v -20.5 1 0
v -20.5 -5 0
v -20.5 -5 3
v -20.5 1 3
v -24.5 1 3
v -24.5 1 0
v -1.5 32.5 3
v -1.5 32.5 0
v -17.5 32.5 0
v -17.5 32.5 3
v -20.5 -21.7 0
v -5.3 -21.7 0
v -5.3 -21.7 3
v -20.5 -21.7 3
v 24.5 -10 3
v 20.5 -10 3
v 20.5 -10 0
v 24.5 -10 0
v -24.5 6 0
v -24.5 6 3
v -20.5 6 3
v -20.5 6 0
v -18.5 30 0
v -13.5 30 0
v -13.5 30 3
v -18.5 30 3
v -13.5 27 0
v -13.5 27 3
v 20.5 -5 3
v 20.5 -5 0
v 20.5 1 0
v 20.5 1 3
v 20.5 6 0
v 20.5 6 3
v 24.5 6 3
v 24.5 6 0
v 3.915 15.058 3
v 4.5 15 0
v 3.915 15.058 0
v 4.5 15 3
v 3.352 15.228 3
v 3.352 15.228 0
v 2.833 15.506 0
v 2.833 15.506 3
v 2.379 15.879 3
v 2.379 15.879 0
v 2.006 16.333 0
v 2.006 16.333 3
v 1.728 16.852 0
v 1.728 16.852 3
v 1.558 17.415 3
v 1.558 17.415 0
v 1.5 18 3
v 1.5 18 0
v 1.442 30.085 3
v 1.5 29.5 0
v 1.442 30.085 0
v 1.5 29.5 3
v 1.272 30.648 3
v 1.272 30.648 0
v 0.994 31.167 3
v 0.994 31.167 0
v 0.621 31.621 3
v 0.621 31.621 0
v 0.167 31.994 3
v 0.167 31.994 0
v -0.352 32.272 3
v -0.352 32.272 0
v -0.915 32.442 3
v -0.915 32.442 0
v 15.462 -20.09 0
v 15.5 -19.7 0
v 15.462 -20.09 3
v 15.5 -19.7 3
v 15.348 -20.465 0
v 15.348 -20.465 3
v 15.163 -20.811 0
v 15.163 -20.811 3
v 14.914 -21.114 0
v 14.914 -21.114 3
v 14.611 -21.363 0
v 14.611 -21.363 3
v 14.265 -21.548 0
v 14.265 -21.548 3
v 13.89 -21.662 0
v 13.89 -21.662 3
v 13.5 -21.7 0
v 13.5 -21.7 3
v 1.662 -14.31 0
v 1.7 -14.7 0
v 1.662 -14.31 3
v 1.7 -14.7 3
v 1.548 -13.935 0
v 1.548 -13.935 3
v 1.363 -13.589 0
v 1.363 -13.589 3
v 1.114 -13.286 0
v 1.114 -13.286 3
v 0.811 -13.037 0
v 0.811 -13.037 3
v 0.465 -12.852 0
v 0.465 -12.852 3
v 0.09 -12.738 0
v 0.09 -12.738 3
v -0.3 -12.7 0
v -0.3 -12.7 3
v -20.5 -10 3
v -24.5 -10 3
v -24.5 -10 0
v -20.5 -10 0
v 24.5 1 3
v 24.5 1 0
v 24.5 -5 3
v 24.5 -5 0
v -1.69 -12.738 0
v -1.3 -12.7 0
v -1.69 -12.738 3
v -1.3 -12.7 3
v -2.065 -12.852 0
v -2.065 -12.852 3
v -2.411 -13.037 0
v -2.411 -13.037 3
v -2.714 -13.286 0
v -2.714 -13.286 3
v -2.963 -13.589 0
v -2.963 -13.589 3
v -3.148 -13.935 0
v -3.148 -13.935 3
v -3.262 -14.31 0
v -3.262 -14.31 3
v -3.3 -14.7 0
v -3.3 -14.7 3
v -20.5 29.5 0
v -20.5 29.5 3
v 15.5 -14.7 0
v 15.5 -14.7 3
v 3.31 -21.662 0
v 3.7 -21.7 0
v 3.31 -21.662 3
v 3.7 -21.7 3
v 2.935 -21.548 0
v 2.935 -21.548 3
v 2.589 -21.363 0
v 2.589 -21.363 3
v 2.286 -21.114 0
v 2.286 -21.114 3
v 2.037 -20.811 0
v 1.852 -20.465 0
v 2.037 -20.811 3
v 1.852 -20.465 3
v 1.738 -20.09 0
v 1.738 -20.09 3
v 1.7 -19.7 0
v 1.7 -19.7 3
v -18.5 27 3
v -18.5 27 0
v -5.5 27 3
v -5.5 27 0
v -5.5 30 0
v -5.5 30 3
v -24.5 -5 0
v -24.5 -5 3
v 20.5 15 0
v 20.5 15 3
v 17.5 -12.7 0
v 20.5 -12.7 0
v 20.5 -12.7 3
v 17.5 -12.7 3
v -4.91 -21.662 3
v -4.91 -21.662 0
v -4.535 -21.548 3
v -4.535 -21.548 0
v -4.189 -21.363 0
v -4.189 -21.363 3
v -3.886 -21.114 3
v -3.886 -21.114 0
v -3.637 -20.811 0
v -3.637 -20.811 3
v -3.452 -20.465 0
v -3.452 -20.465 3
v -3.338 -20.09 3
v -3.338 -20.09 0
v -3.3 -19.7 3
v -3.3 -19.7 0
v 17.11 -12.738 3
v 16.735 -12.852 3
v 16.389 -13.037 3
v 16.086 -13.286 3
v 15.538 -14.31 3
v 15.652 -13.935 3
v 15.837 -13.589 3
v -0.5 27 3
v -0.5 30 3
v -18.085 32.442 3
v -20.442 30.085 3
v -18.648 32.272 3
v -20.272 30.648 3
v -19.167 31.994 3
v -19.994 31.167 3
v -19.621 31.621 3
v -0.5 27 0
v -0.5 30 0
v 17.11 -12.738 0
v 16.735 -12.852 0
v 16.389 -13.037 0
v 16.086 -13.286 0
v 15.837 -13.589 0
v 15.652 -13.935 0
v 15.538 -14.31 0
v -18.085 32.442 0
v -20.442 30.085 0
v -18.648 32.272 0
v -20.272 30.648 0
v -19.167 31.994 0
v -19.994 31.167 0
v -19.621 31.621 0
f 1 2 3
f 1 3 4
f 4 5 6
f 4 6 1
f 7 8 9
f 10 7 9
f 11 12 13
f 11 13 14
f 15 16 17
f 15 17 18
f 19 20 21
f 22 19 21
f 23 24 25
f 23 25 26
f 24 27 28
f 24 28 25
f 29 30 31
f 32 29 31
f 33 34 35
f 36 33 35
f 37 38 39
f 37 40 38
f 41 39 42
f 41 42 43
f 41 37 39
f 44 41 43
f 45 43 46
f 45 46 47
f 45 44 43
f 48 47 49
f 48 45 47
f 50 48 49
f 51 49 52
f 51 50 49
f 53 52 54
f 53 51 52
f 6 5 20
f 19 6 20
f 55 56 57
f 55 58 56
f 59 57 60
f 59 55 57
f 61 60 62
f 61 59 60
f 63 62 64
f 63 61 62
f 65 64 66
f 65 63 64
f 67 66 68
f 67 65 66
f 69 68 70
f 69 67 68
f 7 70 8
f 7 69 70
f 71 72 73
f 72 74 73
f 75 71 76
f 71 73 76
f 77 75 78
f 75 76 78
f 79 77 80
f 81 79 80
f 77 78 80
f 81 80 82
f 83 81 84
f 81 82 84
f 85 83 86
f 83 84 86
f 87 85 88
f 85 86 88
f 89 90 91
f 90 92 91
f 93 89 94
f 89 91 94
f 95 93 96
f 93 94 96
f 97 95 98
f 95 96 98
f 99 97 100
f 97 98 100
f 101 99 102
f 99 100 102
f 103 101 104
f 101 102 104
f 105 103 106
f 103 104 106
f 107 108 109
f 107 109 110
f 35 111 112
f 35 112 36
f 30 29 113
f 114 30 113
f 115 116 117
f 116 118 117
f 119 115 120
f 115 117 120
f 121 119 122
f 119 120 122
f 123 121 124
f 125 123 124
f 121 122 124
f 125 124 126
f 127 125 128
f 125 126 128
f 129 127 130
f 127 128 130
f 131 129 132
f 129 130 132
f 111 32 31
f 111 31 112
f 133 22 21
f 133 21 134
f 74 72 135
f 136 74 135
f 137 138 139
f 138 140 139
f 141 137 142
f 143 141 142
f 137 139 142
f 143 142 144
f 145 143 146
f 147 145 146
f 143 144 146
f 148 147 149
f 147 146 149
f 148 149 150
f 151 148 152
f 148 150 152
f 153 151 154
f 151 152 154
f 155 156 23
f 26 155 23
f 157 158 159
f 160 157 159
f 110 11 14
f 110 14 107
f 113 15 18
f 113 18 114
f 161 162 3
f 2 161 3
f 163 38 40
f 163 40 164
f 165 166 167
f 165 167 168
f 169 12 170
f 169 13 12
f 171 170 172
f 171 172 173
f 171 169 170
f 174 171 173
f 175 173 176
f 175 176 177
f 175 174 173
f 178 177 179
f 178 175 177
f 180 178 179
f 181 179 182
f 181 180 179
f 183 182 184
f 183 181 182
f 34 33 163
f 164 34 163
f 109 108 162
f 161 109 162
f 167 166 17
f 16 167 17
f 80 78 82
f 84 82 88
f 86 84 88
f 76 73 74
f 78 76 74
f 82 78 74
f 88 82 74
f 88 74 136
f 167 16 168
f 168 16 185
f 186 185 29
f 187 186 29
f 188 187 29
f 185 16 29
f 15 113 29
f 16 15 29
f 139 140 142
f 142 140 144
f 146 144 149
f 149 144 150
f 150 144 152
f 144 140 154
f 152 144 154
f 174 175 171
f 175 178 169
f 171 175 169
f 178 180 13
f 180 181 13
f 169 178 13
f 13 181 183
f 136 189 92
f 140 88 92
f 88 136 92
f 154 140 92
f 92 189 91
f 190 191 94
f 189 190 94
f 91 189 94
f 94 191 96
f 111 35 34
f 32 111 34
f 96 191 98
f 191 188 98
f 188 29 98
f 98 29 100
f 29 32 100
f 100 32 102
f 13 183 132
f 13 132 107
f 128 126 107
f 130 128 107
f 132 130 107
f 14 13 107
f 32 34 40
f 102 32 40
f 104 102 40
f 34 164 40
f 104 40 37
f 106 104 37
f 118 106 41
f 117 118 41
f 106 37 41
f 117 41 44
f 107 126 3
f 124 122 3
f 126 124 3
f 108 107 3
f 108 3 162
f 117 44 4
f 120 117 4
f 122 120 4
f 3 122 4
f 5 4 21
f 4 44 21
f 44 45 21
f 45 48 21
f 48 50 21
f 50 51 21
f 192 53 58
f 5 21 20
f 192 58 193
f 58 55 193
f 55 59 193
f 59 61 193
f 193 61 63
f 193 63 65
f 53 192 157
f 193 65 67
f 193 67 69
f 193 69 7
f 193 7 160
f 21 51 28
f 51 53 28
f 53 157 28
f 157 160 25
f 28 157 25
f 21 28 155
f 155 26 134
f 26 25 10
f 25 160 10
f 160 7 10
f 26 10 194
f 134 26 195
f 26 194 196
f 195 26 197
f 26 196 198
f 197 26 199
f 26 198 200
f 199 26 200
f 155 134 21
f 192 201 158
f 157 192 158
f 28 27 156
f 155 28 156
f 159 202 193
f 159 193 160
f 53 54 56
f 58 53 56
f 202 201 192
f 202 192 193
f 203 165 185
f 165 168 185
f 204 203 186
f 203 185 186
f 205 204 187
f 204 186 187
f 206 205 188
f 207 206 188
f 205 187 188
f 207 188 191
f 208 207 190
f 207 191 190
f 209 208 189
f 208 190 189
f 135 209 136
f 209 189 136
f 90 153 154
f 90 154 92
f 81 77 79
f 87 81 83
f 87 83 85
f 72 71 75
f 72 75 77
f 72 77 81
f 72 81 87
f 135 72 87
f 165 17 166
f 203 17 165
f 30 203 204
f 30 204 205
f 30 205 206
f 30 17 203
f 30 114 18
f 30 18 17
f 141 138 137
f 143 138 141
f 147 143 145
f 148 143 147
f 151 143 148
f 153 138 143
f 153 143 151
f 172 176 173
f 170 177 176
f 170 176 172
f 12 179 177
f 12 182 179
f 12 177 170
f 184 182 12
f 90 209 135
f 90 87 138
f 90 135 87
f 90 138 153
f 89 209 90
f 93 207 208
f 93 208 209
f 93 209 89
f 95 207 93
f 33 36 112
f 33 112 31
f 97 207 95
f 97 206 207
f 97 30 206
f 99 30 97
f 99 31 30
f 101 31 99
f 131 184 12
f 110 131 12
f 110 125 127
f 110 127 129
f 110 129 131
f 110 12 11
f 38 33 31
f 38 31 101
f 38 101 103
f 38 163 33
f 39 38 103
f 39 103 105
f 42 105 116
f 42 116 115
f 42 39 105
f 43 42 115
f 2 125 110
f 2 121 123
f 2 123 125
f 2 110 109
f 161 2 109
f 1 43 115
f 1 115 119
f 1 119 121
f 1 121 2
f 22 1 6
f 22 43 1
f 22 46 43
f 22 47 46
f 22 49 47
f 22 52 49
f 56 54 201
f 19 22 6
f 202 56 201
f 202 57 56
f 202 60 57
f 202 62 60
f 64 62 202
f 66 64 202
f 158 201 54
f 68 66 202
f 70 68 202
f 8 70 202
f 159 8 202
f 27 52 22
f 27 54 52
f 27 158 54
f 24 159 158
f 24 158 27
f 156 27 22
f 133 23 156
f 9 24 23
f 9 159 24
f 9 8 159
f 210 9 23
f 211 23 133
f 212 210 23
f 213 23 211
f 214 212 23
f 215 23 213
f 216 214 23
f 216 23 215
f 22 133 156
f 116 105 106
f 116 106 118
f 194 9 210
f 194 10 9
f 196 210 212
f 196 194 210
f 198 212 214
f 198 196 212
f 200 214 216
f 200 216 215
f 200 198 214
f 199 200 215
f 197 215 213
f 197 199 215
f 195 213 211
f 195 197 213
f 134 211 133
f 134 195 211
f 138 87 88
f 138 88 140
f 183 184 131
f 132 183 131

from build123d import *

# Parameters (mm, degrees)
SKETCH_1_W          = 41
SKETCH_1_H          = 30
EXTRUDE_1_DEPTH     = 3
SKETCH_2_W          = 4
SKETCH_2_H          = 5
EXTRUDE_2_DEPTH     = 3
SKETCH_3_W          = 22
SKETCH_3_H          = 17.5
EXTRUDE_3_DEPTH     = 3
SKETCH_4_W          = 5
SKETCH_4_H          = 3
CUT_EXTRUDE_1_DEPTH = 10
SKETCH_5_W          = 41
SKETCH_5_H          = 6.7
EXTRUDE_4_DEPTH     = 3
SKETCH_6_W          = 5
SKETCH_6_H          = 9
CUT_EXTRUDE_2_DEPTH = 10
FILLET_1_R          = 3
FILLET_2_R          = 2


with BuildPart() as part:
    # 草图1 → 凸台-拉伸1 (new body)
    with BuildSketch(Plane.XY):
        Rectangle(SKETCH_1_W, SKETCH_1_H)
    extrude(amount=EXTRUDE_1_DEPTH)

    # 草图2 → 凸台-拉伸2 (add)
    with BuildSketch(Plane.XY.offset(3)):
        with Locations((22.5, -7.5)):
            Rectangle(SKETCH_2_W, SKETCH_2_H)
        with Locations((22.5, 3.5)):
            Rectangle(SKETCH_2_W, SKETCH_2_H)
        with Locations((-22.5, -7.5)):
            Rectangle(SKETCH_2_W, SKETCH_2_H)
        with Locations((-22.5, 3.5)):
            Rectangle(SKETCH_2_W, SKETCH_2_H)
    extrude(amount=-EXTRUDE_2_DEPTH)

    # 草图3 → 凸台-拉伸3 (add)
    with BuildSketch(Plane(origin=(0, 0, 0), x_dir=(-1, 0, 0), z_dir=(0, 0, -1))):
        with Locations((9.5, 23.75)):
            Rectangle(SKETCH_3_W, SKETCH_3_H)
    extrude(amount=-EXTRUDE_3_DEPTH)

    # 草图4 → 切除-拉伸1 (cut)
    with BuildSketch(Plane(origin=(0, 0, 0), x_dir=(-1, 0, 0), z_dir=(0, 0, -1))):
        with Locations((3, 28.5)):
            Rectangle(SKETCH_4_W, SKETCH_4_H)
        with Locations((16, 28.5)):
            Rectangle(SKETCH_4_W, SKETCH_4_H)
    extrude(amount=-CUT_EXTRUDE_1_DEPTH, mode=Mode.SUBTRACT)

    # 草图5 → 凸台-拉伸4 (add)
    with BuildSketch(Plane(origin=(0, 0, 0), x_dir=(-1, 0, 0), z_dir=(0, 0, -1))):
        with Locations((0, -18.35)):
            Rectangle(SKETCH_5_W, SKETCH_5_H)
    extrude(amount=-EXTRUDE_4_DEPTH)

    # 草图6 → 切除-拉伸2 (cut)
    with BuildSketch(Plane(origin=(0, 0, 0), x_dir=(-1, 0, 0), z_dir=(0, 0, -1))):
        with Locations((0.8, -17.2)):
            Rectangle(SKETCH_6_W, SKETCH_6_H)
        with Locations((-18, -17.2)):
            Rectangle(SKETCH_6_W, SKETCH_6_H)
    extrude(amount=-CUT_EXTRUDE_2_DEPTH, mode=Mode.SUBTRACT)

    # 圆角1
    fillet_1_edges = [part.edges().sort_by_distance(p)[0] for p in [
        (-20.5, 32.5, 1.5),
        (1.5, 15, 1.5),
        (1.5, 32.5, 1.5),
    ]]
    fillet(fillet_1_edges, radius=FILLET_1_R)

    # 圆角2
    fillet_2_edges = [part.edges().sort_by_distance(p)[0] for p in [
        (1.7, -21.7, 1.5),
        (-3.3, -21.7, 1.5),
        (15.5, -21.7, 1.5),
        (15.5, -12.7, 1.5),
        (1.7, -12.7, 1.5),
        (-3.3, -12.7, 1.5),
    ]]
    fillet(fillet_2_edges, radius=FILLET_2_R)


solid = part.part
